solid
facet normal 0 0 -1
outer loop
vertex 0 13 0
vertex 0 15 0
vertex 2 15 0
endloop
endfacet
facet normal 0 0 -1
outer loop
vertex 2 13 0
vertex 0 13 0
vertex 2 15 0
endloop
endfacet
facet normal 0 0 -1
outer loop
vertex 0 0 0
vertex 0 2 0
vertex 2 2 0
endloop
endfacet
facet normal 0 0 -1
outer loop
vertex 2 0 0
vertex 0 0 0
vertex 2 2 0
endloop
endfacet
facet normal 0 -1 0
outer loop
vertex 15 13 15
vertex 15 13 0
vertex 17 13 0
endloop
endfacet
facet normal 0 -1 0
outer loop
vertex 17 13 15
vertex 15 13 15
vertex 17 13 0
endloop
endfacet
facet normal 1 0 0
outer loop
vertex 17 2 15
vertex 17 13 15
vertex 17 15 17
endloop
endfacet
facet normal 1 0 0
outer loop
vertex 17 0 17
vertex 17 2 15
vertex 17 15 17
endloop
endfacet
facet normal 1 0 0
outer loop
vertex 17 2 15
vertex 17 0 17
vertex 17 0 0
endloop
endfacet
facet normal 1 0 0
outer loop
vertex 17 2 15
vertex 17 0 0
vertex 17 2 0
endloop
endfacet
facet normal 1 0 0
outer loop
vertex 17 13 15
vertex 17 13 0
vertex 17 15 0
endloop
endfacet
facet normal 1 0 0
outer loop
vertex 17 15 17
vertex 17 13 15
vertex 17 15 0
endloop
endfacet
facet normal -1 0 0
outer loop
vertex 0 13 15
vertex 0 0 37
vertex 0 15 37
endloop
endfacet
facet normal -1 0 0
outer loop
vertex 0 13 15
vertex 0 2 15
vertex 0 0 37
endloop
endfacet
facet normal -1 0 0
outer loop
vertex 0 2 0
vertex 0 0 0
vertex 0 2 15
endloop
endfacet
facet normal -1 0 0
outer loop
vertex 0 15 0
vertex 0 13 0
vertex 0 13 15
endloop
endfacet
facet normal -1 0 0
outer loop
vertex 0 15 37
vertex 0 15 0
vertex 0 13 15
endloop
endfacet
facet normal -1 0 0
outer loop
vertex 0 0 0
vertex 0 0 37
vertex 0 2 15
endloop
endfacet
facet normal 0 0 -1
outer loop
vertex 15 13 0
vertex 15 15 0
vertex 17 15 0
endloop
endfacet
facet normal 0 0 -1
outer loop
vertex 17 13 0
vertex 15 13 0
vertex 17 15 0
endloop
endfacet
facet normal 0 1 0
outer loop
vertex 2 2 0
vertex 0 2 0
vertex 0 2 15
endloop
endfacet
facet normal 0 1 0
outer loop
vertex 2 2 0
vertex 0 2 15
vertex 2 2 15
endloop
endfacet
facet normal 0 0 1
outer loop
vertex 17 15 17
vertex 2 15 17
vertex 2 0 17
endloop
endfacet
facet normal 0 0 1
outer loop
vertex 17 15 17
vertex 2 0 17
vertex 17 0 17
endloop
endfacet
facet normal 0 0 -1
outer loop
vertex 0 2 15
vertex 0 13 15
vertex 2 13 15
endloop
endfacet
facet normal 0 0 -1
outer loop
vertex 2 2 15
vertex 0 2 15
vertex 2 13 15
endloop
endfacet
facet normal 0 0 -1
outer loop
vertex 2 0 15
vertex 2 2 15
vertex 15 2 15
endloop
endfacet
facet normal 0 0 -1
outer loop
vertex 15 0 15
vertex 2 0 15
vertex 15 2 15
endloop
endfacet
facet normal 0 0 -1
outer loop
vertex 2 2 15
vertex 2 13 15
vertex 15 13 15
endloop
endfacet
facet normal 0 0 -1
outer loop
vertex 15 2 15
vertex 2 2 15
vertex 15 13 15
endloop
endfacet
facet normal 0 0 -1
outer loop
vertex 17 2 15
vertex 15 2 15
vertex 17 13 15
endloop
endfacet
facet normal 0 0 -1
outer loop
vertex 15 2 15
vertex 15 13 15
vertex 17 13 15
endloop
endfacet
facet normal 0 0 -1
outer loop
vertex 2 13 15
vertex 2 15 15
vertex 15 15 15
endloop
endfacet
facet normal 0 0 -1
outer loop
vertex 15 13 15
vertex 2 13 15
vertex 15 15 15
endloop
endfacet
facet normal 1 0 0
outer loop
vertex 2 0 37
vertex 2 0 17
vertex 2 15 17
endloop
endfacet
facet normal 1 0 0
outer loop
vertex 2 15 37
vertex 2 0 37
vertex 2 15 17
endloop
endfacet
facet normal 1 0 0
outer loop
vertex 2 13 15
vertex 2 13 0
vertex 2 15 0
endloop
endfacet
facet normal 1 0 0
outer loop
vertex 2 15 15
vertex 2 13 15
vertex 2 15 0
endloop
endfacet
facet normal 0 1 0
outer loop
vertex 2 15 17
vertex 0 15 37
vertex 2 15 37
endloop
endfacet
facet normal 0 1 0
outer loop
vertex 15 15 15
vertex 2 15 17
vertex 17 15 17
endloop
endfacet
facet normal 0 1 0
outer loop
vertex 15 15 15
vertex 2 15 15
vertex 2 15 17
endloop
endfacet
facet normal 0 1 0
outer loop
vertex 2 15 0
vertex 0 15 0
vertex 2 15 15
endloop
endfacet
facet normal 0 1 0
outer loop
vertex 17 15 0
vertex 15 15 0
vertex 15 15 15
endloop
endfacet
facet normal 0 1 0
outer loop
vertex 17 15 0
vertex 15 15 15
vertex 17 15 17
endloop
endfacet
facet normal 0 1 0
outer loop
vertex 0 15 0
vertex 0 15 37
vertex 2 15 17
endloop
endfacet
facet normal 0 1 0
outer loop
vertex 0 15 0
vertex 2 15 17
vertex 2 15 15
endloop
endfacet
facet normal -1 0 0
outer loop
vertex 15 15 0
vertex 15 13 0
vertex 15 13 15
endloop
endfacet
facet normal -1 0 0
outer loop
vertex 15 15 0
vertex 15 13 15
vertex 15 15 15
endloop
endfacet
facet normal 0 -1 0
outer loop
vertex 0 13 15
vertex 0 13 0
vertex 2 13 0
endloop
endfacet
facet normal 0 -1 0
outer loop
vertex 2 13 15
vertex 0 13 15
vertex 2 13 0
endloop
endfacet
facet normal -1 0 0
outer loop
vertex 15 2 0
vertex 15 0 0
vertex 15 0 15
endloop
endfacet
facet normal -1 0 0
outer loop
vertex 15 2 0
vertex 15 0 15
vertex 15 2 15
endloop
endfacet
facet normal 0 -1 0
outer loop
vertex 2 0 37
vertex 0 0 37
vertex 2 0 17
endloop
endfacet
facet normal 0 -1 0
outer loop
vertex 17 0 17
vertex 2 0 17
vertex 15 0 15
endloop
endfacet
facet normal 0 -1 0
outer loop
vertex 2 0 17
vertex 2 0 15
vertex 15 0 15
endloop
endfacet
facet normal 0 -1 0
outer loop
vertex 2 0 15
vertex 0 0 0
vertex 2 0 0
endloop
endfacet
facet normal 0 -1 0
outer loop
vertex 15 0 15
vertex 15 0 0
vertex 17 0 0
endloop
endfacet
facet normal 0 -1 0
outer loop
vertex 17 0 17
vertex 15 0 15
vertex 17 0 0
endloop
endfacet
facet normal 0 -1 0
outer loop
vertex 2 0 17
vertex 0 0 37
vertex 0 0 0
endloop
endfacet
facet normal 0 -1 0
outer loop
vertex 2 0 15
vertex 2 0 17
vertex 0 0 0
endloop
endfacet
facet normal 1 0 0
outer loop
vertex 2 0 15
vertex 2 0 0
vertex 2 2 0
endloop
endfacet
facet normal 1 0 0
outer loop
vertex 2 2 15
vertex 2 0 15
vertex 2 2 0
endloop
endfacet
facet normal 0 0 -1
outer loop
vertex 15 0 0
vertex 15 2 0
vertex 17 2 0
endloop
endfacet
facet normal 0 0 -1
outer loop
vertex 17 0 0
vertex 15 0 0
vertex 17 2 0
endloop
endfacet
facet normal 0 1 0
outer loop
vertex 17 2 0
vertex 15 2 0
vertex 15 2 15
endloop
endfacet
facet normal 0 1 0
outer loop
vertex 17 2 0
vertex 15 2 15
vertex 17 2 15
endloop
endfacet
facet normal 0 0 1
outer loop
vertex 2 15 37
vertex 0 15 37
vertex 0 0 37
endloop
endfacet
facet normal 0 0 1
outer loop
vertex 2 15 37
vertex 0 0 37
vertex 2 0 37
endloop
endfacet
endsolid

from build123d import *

# Parameters (mm, degrees)
BOX018_W         = 2
BOX018_H         = 2
BOX018_DEPTH     = 15
ARRAY003_X_COUNT = 2
ARRAY003_X_PITCH = 15
ARRAY003_Y_COUNT = 2
ARRAY003_Y_PITCH = 13
BOX017_W         = 25
BOX017_H         = 20
BOX017_DEPTH     = 25
BOX016_W         = 17
BOX016_H         = 15
BOX016_DEPTH     = 22


with BuildPart() as matriz_4_patas_silla:
    # Box018 → Box018 (new body)
    with BuildSketch(Plane.XY):
        with Locations((1, 1)):
            Rectangle(BOX018_W, BOX018_H)
    extrude(amount=BOX018_DEPTH)

    # Array003 X: Matriz 4 patas silla ×2


with BuildPart() as matriz_4_patas_silla_1:
    add(matriz_4_patas_silla.part)
    with Locations(*[(i * ARRAY003_X_PITCH, 0, 0) for i in range(1, ARRAY003_X_COUNT)]):
        add(matriz_4_patas_silla.part)

    # Array003 Y: Matriz 4 patas silla ×2


with BuildPart() as matriz_4_patas_silla_2:
    add(matriz_4_patas_silla_1.part)
    with Locations(*[(0, i * ARRAY003_Y_PITCH, 0) for i in range(1, ARRAY003_Y_COUNT)]):
        add(matriz_4_patas_silla_1.part)


with BuildPart() as vaciado_respaldo_silla:
    # Box017 → Box017 (new body)
    with BuildSketch(Plane(origin=(2, -2, 2), x_dir=(1, 0, 0), z_dir=(0, 0, 1))):
        with Locations((12.5, 10)):
            Rectangle(BOX017_W, BOX017_H)
    extrude(amount=BOX017_DEPTH)


with BuildPart() as silla_master:
    # Box016 → Box016 (new body)
    with BuildSketch(Plane.XY):
        with Locations((8.5, 7.5)):
            Rectangle(BOX016_W, BOX016_H)
    extrude(amount=BOX016_DEPTH)

    # Cut003: cut Vaciado respaldo silla
    add(vaciado_respaldo_silla.part, mode=Mode.SUBTRACT)


with BuildPart() as silla_master_1:
    # Cut003 placement: moved
    add(silla_master.part.moved(Location((0, 0, 15))))

    # Fusion005: union Matriz 4 patas silla
    add(matriz_4_patas_silla_2.part)


solid = silla_master_1.part
